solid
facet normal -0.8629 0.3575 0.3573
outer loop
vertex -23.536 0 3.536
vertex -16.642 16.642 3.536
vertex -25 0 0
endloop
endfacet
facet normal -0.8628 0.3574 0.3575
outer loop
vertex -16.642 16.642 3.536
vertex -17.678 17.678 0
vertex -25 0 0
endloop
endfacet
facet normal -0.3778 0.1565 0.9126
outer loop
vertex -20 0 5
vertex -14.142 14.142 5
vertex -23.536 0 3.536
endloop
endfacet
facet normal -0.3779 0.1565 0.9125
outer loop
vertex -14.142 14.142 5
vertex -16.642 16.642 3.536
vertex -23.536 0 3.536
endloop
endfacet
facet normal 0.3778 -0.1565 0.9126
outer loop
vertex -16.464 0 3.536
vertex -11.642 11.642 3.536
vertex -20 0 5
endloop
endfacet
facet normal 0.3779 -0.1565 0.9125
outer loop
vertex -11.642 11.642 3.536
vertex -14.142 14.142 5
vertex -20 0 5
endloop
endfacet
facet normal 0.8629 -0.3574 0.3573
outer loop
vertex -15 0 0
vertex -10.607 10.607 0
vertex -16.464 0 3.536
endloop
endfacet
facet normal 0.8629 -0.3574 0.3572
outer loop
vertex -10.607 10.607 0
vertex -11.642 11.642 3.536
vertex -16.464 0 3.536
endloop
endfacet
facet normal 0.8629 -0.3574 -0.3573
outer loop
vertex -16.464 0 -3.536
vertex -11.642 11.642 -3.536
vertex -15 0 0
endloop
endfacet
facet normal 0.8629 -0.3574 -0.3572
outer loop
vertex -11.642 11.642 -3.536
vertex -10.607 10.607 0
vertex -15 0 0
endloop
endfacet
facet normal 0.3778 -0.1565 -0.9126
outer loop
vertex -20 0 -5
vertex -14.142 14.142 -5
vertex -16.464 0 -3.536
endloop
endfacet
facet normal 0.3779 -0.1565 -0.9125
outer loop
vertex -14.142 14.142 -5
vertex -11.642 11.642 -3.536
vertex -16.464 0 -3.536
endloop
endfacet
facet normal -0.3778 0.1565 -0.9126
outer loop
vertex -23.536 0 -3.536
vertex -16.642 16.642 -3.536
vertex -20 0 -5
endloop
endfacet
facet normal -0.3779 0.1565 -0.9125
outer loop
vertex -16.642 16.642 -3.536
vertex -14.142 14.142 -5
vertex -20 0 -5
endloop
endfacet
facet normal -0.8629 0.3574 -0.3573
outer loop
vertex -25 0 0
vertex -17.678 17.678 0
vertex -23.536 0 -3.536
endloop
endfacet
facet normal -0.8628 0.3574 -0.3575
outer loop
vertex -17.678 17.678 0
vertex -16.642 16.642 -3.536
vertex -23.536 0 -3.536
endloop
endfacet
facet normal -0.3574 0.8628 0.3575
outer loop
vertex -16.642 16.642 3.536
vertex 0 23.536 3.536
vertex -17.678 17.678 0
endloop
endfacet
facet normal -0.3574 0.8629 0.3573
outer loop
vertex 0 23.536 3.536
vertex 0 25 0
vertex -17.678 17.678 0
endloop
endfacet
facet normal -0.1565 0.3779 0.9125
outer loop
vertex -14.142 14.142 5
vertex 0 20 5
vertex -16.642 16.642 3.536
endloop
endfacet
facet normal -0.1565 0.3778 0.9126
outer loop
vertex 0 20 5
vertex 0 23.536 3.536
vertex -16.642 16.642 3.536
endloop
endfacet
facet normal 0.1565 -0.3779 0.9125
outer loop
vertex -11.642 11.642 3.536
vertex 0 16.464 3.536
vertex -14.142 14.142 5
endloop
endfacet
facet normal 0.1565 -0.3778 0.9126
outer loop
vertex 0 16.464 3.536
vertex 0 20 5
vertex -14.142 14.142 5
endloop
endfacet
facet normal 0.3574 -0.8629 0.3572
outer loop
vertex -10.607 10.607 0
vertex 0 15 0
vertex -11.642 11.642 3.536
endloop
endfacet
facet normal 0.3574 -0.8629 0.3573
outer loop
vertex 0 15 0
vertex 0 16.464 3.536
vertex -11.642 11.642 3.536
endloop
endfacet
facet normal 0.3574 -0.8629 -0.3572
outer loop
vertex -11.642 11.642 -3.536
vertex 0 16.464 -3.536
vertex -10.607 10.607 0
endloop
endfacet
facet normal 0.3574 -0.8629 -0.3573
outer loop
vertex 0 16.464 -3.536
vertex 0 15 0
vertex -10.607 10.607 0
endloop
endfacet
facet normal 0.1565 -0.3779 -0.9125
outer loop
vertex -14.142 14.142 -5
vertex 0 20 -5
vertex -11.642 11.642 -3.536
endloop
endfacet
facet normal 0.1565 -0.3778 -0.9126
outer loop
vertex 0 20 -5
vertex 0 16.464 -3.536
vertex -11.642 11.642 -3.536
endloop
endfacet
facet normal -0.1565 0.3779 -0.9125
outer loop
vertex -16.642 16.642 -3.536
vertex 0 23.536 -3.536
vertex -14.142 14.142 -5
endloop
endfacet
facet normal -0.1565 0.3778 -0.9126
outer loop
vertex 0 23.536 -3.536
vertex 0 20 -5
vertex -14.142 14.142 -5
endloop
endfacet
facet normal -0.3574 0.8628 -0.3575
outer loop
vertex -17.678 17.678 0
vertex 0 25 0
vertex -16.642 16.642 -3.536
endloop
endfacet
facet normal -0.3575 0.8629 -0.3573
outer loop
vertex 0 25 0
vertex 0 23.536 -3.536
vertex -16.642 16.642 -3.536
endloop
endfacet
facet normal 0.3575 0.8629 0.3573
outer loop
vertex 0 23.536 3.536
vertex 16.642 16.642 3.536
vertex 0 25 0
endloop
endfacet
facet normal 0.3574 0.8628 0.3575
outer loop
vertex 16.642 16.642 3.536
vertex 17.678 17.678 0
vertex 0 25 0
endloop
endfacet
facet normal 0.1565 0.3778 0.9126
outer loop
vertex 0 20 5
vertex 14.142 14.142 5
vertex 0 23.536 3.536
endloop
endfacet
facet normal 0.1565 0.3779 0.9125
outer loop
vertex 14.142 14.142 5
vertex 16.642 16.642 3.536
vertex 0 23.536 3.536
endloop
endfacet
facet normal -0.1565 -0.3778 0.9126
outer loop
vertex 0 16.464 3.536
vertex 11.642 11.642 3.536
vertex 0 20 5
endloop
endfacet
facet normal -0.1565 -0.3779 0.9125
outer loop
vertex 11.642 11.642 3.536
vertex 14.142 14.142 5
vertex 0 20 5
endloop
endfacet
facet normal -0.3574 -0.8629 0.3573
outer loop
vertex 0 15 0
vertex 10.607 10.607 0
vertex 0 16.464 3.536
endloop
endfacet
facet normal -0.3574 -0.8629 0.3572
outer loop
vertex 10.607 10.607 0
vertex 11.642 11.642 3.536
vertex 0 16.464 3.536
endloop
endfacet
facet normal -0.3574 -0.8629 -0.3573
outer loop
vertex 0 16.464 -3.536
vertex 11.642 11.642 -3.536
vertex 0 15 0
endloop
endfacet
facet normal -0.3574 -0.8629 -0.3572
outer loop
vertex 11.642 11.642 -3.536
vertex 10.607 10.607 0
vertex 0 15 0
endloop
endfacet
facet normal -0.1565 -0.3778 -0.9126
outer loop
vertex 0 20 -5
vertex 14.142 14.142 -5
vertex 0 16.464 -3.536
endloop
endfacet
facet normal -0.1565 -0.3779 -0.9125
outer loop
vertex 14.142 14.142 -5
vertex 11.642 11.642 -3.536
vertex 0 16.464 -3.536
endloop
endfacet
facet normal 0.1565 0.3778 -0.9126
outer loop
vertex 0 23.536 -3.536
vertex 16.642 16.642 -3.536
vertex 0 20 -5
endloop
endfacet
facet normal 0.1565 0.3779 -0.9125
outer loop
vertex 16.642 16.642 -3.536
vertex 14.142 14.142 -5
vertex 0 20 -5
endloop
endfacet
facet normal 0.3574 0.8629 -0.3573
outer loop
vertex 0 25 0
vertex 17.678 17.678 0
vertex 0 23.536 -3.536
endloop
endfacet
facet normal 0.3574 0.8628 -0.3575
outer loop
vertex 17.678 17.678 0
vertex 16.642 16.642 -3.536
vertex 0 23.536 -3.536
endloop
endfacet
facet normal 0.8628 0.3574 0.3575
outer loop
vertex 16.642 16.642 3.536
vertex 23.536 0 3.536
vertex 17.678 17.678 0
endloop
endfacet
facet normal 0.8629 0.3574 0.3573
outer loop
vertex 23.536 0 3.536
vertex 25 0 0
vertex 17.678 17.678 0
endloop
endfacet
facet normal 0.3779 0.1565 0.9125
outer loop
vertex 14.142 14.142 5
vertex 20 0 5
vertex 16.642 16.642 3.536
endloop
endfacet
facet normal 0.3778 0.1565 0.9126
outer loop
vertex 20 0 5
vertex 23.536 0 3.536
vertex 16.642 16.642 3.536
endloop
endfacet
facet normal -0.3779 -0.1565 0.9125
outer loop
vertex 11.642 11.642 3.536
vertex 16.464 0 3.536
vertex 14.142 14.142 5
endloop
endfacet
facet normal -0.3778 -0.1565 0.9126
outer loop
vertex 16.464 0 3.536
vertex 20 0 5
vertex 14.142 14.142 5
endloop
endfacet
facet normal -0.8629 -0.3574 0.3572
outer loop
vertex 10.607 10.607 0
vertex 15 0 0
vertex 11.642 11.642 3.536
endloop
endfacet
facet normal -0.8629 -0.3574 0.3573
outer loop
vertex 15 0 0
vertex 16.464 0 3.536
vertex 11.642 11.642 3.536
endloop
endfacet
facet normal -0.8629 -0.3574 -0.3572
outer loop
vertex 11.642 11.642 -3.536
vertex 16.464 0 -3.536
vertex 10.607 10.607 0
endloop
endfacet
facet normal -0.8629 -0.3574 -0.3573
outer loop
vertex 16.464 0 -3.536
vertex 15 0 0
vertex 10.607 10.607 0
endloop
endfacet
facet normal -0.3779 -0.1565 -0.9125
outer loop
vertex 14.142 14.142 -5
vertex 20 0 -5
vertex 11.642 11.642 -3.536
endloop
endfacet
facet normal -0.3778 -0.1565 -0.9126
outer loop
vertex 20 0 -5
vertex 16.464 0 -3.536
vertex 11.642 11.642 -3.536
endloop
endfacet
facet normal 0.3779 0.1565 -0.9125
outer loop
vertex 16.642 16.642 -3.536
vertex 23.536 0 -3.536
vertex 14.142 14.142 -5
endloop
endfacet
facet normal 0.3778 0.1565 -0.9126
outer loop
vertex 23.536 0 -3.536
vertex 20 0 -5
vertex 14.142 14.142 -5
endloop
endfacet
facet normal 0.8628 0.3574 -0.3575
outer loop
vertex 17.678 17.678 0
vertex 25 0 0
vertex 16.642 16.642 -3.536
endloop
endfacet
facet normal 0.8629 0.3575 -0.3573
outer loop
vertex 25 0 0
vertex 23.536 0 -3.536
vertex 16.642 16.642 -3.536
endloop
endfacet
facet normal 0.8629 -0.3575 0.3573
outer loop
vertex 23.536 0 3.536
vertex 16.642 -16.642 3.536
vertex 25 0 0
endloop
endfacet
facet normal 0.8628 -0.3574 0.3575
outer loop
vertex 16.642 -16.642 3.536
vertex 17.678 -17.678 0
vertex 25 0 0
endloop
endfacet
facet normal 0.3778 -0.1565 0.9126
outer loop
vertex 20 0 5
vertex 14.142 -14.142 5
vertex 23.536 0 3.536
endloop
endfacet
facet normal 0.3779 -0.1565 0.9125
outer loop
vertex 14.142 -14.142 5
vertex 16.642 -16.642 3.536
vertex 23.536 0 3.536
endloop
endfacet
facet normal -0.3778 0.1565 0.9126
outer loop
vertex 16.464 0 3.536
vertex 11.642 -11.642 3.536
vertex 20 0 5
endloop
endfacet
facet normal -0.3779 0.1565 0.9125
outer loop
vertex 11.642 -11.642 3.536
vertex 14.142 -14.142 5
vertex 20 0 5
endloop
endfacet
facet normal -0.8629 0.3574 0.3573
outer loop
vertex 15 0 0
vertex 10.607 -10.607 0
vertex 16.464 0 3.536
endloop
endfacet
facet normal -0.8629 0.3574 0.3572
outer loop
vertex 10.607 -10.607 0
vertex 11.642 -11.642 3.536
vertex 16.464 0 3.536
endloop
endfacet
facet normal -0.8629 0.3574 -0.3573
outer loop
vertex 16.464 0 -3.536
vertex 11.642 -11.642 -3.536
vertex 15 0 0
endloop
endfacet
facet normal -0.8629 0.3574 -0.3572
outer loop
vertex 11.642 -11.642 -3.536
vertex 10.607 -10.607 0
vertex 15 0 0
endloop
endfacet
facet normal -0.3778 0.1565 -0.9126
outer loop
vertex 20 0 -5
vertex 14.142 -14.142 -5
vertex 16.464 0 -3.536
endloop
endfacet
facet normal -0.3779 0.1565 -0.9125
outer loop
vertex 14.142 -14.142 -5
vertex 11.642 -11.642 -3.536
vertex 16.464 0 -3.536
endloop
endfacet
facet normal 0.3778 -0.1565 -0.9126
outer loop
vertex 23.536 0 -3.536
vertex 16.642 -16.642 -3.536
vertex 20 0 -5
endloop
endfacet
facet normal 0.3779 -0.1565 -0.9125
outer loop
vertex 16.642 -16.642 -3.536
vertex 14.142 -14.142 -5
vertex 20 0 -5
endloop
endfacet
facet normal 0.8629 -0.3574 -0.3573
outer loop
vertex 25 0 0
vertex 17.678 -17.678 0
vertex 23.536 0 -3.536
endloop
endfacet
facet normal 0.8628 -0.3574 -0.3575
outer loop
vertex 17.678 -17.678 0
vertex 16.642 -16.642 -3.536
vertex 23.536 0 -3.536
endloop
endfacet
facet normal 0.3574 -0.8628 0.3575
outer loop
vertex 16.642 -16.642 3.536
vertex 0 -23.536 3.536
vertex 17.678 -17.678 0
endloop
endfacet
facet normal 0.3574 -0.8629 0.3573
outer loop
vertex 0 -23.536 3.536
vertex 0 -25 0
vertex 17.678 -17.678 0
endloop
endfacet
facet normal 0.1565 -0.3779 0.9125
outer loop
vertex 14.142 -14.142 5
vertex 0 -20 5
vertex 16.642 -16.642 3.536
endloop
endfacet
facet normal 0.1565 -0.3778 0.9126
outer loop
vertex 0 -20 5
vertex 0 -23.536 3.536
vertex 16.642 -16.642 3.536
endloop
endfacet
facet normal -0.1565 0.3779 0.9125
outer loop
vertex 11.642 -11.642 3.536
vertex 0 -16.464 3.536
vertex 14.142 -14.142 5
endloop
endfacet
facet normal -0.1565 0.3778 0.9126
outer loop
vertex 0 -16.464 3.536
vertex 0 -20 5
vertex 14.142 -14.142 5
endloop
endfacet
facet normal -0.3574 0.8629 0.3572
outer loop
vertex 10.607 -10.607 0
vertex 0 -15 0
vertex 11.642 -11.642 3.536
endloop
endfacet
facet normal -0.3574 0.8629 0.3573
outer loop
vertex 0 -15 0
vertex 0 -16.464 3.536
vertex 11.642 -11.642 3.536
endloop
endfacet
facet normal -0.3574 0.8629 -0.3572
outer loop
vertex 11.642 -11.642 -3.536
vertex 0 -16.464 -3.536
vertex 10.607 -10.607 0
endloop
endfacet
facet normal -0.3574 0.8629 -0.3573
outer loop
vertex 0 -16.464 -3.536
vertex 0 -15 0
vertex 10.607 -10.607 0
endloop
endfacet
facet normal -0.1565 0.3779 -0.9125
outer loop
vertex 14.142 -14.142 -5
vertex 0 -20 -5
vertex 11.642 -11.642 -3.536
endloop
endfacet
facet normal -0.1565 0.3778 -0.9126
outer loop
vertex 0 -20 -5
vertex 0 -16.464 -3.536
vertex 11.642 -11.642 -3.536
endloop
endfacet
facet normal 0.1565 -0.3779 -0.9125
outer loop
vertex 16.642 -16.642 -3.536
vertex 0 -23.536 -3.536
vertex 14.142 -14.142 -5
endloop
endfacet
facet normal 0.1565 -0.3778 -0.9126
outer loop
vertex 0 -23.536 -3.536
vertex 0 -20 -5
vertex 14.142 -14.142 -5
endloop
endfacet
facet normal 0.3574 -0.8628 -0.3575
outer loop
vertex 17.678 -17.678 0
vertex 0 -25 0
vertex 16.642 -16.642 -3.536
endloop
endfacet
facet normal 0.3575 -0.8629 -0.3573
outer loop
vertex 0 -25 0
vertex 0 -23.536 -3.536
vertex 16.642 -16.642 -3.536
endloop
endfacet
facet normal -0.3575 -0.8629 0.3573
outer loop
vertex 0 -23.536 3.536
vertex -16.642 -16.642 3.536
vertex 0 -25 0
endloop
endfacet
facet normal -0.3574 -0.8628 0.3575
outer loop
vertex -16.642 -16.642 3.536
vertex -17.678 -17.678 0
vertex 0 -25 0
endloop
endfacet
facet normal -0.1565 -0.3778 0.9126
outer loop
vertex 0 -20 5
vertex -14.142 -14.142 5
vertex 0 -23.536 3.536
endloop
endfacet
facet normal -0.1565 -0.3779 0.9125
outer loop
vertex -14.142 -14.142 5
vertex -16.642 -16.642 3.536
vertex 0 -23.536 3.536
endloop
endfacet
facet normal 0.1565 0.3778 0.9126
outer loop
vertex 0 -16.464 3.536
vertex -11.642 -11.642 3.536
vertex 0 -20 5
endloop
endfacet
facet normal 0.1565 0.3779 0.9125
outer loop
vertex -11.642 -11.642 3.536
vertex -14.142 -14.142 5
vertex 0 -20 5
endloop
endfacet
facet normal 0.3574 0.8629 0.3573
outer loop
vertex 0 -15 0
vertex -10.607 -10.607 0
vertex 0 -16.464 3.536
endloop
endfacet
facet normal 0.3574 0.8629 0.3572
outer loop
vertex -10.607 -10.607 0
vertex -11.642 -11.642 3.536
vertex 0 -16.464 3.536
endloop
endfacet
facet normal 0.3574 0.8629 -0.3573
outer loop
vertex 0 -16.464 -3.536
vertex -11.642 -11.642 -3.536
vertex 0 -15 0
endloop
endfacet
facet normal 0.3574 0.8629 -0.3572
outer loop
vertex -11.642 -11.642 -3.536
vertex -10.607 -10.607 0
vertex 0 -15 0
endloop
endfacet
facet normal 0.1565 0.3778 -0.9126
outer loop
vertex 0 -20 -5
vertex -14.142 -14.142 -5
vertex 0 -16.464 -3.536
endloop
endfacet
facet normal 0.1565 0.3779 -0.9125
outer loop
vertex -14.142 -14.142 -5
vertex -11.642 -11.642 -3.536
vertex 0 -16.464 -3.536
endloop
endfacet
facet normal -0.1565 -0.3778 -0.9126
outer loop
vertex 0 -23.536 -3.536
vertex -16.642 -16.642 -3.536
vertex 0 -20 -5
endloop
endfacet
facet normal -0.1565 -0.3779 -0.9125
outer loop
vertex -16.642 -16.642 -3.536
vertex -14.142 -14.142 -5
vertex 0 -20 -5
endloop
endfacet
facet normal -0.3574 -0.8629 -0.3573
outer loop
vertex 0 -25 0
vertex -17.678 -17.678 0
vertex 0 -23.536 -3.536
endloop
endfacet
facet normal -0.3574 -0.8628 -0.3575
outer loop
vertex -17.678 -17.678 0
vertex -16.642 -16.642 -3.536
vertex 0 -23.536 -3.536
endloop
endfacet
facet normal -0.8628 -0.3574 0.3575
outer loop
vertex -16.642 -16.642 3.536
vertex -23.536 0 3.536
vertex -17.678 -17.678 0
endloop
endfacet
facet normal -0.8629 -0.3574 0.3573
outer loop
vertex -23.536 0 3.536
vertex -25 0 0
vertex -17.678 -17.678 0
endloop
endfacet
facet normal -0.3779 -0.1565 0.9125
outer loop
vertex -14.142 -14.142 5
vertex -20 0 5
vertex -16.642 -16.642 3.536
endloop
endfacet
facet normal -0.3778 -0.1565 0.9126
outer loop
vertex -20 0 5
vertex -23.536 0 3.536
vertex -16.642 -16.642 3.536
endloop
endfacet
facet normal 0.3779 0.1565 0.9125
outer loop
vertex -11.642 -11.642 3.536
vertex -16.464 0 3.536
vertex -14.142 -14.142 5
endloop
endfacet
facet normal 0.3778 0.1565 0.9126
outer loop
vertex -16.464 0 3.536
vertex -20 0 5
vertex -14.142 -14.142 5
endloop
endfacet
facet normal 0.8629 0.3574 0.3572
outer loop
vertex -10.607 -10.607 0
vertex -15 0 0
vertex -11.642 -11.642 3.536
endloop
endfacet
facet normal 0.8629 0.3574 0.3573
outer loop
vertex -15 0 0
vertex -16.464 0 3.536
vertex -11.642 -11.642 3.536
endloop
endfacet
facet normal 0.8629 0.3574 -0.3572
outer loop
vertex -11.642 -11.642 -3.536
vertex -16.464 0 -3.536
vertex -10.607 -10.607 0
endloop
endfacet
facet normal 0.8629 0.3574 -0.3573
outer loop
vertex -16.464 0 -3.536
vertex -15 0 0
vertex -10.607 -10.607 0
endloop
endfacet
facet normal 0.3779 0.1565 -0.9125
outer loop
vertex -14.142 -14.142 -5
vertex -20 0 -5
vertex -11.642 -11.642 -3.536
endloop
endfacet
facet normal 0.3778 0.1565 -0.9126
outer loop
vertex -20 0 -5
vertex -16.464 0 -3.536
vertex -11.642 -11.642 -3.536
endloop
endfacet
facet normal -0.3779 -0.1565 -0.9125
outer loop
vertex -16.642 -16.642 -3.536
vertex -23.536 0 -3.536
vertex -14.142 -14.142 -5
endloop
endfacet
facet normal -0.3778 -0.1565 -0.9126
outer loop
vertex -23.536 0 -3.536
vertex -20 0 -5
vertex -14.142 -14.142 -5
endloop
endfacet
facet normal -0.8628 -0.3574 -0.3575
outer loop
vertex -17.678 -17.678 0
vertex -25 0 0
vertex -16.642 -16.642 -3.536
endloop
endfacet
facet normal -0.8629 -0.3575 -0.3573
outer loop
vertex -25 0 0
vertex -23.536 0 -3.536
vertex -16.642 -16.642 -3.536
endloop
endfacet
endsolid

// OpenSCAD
torus_r = 20;
hole_r = 5;
torus_sides = 8;

module torus(torus_r, hole_r, sides) {
    $fn = sides;
    
    rotate_extrude(convexity = 10) {
        translate([torus_r, 0, 0]) {
            circle(r = hole_r);
        }
    }
}

torus(torus_r, hole_r, torus_sides);
